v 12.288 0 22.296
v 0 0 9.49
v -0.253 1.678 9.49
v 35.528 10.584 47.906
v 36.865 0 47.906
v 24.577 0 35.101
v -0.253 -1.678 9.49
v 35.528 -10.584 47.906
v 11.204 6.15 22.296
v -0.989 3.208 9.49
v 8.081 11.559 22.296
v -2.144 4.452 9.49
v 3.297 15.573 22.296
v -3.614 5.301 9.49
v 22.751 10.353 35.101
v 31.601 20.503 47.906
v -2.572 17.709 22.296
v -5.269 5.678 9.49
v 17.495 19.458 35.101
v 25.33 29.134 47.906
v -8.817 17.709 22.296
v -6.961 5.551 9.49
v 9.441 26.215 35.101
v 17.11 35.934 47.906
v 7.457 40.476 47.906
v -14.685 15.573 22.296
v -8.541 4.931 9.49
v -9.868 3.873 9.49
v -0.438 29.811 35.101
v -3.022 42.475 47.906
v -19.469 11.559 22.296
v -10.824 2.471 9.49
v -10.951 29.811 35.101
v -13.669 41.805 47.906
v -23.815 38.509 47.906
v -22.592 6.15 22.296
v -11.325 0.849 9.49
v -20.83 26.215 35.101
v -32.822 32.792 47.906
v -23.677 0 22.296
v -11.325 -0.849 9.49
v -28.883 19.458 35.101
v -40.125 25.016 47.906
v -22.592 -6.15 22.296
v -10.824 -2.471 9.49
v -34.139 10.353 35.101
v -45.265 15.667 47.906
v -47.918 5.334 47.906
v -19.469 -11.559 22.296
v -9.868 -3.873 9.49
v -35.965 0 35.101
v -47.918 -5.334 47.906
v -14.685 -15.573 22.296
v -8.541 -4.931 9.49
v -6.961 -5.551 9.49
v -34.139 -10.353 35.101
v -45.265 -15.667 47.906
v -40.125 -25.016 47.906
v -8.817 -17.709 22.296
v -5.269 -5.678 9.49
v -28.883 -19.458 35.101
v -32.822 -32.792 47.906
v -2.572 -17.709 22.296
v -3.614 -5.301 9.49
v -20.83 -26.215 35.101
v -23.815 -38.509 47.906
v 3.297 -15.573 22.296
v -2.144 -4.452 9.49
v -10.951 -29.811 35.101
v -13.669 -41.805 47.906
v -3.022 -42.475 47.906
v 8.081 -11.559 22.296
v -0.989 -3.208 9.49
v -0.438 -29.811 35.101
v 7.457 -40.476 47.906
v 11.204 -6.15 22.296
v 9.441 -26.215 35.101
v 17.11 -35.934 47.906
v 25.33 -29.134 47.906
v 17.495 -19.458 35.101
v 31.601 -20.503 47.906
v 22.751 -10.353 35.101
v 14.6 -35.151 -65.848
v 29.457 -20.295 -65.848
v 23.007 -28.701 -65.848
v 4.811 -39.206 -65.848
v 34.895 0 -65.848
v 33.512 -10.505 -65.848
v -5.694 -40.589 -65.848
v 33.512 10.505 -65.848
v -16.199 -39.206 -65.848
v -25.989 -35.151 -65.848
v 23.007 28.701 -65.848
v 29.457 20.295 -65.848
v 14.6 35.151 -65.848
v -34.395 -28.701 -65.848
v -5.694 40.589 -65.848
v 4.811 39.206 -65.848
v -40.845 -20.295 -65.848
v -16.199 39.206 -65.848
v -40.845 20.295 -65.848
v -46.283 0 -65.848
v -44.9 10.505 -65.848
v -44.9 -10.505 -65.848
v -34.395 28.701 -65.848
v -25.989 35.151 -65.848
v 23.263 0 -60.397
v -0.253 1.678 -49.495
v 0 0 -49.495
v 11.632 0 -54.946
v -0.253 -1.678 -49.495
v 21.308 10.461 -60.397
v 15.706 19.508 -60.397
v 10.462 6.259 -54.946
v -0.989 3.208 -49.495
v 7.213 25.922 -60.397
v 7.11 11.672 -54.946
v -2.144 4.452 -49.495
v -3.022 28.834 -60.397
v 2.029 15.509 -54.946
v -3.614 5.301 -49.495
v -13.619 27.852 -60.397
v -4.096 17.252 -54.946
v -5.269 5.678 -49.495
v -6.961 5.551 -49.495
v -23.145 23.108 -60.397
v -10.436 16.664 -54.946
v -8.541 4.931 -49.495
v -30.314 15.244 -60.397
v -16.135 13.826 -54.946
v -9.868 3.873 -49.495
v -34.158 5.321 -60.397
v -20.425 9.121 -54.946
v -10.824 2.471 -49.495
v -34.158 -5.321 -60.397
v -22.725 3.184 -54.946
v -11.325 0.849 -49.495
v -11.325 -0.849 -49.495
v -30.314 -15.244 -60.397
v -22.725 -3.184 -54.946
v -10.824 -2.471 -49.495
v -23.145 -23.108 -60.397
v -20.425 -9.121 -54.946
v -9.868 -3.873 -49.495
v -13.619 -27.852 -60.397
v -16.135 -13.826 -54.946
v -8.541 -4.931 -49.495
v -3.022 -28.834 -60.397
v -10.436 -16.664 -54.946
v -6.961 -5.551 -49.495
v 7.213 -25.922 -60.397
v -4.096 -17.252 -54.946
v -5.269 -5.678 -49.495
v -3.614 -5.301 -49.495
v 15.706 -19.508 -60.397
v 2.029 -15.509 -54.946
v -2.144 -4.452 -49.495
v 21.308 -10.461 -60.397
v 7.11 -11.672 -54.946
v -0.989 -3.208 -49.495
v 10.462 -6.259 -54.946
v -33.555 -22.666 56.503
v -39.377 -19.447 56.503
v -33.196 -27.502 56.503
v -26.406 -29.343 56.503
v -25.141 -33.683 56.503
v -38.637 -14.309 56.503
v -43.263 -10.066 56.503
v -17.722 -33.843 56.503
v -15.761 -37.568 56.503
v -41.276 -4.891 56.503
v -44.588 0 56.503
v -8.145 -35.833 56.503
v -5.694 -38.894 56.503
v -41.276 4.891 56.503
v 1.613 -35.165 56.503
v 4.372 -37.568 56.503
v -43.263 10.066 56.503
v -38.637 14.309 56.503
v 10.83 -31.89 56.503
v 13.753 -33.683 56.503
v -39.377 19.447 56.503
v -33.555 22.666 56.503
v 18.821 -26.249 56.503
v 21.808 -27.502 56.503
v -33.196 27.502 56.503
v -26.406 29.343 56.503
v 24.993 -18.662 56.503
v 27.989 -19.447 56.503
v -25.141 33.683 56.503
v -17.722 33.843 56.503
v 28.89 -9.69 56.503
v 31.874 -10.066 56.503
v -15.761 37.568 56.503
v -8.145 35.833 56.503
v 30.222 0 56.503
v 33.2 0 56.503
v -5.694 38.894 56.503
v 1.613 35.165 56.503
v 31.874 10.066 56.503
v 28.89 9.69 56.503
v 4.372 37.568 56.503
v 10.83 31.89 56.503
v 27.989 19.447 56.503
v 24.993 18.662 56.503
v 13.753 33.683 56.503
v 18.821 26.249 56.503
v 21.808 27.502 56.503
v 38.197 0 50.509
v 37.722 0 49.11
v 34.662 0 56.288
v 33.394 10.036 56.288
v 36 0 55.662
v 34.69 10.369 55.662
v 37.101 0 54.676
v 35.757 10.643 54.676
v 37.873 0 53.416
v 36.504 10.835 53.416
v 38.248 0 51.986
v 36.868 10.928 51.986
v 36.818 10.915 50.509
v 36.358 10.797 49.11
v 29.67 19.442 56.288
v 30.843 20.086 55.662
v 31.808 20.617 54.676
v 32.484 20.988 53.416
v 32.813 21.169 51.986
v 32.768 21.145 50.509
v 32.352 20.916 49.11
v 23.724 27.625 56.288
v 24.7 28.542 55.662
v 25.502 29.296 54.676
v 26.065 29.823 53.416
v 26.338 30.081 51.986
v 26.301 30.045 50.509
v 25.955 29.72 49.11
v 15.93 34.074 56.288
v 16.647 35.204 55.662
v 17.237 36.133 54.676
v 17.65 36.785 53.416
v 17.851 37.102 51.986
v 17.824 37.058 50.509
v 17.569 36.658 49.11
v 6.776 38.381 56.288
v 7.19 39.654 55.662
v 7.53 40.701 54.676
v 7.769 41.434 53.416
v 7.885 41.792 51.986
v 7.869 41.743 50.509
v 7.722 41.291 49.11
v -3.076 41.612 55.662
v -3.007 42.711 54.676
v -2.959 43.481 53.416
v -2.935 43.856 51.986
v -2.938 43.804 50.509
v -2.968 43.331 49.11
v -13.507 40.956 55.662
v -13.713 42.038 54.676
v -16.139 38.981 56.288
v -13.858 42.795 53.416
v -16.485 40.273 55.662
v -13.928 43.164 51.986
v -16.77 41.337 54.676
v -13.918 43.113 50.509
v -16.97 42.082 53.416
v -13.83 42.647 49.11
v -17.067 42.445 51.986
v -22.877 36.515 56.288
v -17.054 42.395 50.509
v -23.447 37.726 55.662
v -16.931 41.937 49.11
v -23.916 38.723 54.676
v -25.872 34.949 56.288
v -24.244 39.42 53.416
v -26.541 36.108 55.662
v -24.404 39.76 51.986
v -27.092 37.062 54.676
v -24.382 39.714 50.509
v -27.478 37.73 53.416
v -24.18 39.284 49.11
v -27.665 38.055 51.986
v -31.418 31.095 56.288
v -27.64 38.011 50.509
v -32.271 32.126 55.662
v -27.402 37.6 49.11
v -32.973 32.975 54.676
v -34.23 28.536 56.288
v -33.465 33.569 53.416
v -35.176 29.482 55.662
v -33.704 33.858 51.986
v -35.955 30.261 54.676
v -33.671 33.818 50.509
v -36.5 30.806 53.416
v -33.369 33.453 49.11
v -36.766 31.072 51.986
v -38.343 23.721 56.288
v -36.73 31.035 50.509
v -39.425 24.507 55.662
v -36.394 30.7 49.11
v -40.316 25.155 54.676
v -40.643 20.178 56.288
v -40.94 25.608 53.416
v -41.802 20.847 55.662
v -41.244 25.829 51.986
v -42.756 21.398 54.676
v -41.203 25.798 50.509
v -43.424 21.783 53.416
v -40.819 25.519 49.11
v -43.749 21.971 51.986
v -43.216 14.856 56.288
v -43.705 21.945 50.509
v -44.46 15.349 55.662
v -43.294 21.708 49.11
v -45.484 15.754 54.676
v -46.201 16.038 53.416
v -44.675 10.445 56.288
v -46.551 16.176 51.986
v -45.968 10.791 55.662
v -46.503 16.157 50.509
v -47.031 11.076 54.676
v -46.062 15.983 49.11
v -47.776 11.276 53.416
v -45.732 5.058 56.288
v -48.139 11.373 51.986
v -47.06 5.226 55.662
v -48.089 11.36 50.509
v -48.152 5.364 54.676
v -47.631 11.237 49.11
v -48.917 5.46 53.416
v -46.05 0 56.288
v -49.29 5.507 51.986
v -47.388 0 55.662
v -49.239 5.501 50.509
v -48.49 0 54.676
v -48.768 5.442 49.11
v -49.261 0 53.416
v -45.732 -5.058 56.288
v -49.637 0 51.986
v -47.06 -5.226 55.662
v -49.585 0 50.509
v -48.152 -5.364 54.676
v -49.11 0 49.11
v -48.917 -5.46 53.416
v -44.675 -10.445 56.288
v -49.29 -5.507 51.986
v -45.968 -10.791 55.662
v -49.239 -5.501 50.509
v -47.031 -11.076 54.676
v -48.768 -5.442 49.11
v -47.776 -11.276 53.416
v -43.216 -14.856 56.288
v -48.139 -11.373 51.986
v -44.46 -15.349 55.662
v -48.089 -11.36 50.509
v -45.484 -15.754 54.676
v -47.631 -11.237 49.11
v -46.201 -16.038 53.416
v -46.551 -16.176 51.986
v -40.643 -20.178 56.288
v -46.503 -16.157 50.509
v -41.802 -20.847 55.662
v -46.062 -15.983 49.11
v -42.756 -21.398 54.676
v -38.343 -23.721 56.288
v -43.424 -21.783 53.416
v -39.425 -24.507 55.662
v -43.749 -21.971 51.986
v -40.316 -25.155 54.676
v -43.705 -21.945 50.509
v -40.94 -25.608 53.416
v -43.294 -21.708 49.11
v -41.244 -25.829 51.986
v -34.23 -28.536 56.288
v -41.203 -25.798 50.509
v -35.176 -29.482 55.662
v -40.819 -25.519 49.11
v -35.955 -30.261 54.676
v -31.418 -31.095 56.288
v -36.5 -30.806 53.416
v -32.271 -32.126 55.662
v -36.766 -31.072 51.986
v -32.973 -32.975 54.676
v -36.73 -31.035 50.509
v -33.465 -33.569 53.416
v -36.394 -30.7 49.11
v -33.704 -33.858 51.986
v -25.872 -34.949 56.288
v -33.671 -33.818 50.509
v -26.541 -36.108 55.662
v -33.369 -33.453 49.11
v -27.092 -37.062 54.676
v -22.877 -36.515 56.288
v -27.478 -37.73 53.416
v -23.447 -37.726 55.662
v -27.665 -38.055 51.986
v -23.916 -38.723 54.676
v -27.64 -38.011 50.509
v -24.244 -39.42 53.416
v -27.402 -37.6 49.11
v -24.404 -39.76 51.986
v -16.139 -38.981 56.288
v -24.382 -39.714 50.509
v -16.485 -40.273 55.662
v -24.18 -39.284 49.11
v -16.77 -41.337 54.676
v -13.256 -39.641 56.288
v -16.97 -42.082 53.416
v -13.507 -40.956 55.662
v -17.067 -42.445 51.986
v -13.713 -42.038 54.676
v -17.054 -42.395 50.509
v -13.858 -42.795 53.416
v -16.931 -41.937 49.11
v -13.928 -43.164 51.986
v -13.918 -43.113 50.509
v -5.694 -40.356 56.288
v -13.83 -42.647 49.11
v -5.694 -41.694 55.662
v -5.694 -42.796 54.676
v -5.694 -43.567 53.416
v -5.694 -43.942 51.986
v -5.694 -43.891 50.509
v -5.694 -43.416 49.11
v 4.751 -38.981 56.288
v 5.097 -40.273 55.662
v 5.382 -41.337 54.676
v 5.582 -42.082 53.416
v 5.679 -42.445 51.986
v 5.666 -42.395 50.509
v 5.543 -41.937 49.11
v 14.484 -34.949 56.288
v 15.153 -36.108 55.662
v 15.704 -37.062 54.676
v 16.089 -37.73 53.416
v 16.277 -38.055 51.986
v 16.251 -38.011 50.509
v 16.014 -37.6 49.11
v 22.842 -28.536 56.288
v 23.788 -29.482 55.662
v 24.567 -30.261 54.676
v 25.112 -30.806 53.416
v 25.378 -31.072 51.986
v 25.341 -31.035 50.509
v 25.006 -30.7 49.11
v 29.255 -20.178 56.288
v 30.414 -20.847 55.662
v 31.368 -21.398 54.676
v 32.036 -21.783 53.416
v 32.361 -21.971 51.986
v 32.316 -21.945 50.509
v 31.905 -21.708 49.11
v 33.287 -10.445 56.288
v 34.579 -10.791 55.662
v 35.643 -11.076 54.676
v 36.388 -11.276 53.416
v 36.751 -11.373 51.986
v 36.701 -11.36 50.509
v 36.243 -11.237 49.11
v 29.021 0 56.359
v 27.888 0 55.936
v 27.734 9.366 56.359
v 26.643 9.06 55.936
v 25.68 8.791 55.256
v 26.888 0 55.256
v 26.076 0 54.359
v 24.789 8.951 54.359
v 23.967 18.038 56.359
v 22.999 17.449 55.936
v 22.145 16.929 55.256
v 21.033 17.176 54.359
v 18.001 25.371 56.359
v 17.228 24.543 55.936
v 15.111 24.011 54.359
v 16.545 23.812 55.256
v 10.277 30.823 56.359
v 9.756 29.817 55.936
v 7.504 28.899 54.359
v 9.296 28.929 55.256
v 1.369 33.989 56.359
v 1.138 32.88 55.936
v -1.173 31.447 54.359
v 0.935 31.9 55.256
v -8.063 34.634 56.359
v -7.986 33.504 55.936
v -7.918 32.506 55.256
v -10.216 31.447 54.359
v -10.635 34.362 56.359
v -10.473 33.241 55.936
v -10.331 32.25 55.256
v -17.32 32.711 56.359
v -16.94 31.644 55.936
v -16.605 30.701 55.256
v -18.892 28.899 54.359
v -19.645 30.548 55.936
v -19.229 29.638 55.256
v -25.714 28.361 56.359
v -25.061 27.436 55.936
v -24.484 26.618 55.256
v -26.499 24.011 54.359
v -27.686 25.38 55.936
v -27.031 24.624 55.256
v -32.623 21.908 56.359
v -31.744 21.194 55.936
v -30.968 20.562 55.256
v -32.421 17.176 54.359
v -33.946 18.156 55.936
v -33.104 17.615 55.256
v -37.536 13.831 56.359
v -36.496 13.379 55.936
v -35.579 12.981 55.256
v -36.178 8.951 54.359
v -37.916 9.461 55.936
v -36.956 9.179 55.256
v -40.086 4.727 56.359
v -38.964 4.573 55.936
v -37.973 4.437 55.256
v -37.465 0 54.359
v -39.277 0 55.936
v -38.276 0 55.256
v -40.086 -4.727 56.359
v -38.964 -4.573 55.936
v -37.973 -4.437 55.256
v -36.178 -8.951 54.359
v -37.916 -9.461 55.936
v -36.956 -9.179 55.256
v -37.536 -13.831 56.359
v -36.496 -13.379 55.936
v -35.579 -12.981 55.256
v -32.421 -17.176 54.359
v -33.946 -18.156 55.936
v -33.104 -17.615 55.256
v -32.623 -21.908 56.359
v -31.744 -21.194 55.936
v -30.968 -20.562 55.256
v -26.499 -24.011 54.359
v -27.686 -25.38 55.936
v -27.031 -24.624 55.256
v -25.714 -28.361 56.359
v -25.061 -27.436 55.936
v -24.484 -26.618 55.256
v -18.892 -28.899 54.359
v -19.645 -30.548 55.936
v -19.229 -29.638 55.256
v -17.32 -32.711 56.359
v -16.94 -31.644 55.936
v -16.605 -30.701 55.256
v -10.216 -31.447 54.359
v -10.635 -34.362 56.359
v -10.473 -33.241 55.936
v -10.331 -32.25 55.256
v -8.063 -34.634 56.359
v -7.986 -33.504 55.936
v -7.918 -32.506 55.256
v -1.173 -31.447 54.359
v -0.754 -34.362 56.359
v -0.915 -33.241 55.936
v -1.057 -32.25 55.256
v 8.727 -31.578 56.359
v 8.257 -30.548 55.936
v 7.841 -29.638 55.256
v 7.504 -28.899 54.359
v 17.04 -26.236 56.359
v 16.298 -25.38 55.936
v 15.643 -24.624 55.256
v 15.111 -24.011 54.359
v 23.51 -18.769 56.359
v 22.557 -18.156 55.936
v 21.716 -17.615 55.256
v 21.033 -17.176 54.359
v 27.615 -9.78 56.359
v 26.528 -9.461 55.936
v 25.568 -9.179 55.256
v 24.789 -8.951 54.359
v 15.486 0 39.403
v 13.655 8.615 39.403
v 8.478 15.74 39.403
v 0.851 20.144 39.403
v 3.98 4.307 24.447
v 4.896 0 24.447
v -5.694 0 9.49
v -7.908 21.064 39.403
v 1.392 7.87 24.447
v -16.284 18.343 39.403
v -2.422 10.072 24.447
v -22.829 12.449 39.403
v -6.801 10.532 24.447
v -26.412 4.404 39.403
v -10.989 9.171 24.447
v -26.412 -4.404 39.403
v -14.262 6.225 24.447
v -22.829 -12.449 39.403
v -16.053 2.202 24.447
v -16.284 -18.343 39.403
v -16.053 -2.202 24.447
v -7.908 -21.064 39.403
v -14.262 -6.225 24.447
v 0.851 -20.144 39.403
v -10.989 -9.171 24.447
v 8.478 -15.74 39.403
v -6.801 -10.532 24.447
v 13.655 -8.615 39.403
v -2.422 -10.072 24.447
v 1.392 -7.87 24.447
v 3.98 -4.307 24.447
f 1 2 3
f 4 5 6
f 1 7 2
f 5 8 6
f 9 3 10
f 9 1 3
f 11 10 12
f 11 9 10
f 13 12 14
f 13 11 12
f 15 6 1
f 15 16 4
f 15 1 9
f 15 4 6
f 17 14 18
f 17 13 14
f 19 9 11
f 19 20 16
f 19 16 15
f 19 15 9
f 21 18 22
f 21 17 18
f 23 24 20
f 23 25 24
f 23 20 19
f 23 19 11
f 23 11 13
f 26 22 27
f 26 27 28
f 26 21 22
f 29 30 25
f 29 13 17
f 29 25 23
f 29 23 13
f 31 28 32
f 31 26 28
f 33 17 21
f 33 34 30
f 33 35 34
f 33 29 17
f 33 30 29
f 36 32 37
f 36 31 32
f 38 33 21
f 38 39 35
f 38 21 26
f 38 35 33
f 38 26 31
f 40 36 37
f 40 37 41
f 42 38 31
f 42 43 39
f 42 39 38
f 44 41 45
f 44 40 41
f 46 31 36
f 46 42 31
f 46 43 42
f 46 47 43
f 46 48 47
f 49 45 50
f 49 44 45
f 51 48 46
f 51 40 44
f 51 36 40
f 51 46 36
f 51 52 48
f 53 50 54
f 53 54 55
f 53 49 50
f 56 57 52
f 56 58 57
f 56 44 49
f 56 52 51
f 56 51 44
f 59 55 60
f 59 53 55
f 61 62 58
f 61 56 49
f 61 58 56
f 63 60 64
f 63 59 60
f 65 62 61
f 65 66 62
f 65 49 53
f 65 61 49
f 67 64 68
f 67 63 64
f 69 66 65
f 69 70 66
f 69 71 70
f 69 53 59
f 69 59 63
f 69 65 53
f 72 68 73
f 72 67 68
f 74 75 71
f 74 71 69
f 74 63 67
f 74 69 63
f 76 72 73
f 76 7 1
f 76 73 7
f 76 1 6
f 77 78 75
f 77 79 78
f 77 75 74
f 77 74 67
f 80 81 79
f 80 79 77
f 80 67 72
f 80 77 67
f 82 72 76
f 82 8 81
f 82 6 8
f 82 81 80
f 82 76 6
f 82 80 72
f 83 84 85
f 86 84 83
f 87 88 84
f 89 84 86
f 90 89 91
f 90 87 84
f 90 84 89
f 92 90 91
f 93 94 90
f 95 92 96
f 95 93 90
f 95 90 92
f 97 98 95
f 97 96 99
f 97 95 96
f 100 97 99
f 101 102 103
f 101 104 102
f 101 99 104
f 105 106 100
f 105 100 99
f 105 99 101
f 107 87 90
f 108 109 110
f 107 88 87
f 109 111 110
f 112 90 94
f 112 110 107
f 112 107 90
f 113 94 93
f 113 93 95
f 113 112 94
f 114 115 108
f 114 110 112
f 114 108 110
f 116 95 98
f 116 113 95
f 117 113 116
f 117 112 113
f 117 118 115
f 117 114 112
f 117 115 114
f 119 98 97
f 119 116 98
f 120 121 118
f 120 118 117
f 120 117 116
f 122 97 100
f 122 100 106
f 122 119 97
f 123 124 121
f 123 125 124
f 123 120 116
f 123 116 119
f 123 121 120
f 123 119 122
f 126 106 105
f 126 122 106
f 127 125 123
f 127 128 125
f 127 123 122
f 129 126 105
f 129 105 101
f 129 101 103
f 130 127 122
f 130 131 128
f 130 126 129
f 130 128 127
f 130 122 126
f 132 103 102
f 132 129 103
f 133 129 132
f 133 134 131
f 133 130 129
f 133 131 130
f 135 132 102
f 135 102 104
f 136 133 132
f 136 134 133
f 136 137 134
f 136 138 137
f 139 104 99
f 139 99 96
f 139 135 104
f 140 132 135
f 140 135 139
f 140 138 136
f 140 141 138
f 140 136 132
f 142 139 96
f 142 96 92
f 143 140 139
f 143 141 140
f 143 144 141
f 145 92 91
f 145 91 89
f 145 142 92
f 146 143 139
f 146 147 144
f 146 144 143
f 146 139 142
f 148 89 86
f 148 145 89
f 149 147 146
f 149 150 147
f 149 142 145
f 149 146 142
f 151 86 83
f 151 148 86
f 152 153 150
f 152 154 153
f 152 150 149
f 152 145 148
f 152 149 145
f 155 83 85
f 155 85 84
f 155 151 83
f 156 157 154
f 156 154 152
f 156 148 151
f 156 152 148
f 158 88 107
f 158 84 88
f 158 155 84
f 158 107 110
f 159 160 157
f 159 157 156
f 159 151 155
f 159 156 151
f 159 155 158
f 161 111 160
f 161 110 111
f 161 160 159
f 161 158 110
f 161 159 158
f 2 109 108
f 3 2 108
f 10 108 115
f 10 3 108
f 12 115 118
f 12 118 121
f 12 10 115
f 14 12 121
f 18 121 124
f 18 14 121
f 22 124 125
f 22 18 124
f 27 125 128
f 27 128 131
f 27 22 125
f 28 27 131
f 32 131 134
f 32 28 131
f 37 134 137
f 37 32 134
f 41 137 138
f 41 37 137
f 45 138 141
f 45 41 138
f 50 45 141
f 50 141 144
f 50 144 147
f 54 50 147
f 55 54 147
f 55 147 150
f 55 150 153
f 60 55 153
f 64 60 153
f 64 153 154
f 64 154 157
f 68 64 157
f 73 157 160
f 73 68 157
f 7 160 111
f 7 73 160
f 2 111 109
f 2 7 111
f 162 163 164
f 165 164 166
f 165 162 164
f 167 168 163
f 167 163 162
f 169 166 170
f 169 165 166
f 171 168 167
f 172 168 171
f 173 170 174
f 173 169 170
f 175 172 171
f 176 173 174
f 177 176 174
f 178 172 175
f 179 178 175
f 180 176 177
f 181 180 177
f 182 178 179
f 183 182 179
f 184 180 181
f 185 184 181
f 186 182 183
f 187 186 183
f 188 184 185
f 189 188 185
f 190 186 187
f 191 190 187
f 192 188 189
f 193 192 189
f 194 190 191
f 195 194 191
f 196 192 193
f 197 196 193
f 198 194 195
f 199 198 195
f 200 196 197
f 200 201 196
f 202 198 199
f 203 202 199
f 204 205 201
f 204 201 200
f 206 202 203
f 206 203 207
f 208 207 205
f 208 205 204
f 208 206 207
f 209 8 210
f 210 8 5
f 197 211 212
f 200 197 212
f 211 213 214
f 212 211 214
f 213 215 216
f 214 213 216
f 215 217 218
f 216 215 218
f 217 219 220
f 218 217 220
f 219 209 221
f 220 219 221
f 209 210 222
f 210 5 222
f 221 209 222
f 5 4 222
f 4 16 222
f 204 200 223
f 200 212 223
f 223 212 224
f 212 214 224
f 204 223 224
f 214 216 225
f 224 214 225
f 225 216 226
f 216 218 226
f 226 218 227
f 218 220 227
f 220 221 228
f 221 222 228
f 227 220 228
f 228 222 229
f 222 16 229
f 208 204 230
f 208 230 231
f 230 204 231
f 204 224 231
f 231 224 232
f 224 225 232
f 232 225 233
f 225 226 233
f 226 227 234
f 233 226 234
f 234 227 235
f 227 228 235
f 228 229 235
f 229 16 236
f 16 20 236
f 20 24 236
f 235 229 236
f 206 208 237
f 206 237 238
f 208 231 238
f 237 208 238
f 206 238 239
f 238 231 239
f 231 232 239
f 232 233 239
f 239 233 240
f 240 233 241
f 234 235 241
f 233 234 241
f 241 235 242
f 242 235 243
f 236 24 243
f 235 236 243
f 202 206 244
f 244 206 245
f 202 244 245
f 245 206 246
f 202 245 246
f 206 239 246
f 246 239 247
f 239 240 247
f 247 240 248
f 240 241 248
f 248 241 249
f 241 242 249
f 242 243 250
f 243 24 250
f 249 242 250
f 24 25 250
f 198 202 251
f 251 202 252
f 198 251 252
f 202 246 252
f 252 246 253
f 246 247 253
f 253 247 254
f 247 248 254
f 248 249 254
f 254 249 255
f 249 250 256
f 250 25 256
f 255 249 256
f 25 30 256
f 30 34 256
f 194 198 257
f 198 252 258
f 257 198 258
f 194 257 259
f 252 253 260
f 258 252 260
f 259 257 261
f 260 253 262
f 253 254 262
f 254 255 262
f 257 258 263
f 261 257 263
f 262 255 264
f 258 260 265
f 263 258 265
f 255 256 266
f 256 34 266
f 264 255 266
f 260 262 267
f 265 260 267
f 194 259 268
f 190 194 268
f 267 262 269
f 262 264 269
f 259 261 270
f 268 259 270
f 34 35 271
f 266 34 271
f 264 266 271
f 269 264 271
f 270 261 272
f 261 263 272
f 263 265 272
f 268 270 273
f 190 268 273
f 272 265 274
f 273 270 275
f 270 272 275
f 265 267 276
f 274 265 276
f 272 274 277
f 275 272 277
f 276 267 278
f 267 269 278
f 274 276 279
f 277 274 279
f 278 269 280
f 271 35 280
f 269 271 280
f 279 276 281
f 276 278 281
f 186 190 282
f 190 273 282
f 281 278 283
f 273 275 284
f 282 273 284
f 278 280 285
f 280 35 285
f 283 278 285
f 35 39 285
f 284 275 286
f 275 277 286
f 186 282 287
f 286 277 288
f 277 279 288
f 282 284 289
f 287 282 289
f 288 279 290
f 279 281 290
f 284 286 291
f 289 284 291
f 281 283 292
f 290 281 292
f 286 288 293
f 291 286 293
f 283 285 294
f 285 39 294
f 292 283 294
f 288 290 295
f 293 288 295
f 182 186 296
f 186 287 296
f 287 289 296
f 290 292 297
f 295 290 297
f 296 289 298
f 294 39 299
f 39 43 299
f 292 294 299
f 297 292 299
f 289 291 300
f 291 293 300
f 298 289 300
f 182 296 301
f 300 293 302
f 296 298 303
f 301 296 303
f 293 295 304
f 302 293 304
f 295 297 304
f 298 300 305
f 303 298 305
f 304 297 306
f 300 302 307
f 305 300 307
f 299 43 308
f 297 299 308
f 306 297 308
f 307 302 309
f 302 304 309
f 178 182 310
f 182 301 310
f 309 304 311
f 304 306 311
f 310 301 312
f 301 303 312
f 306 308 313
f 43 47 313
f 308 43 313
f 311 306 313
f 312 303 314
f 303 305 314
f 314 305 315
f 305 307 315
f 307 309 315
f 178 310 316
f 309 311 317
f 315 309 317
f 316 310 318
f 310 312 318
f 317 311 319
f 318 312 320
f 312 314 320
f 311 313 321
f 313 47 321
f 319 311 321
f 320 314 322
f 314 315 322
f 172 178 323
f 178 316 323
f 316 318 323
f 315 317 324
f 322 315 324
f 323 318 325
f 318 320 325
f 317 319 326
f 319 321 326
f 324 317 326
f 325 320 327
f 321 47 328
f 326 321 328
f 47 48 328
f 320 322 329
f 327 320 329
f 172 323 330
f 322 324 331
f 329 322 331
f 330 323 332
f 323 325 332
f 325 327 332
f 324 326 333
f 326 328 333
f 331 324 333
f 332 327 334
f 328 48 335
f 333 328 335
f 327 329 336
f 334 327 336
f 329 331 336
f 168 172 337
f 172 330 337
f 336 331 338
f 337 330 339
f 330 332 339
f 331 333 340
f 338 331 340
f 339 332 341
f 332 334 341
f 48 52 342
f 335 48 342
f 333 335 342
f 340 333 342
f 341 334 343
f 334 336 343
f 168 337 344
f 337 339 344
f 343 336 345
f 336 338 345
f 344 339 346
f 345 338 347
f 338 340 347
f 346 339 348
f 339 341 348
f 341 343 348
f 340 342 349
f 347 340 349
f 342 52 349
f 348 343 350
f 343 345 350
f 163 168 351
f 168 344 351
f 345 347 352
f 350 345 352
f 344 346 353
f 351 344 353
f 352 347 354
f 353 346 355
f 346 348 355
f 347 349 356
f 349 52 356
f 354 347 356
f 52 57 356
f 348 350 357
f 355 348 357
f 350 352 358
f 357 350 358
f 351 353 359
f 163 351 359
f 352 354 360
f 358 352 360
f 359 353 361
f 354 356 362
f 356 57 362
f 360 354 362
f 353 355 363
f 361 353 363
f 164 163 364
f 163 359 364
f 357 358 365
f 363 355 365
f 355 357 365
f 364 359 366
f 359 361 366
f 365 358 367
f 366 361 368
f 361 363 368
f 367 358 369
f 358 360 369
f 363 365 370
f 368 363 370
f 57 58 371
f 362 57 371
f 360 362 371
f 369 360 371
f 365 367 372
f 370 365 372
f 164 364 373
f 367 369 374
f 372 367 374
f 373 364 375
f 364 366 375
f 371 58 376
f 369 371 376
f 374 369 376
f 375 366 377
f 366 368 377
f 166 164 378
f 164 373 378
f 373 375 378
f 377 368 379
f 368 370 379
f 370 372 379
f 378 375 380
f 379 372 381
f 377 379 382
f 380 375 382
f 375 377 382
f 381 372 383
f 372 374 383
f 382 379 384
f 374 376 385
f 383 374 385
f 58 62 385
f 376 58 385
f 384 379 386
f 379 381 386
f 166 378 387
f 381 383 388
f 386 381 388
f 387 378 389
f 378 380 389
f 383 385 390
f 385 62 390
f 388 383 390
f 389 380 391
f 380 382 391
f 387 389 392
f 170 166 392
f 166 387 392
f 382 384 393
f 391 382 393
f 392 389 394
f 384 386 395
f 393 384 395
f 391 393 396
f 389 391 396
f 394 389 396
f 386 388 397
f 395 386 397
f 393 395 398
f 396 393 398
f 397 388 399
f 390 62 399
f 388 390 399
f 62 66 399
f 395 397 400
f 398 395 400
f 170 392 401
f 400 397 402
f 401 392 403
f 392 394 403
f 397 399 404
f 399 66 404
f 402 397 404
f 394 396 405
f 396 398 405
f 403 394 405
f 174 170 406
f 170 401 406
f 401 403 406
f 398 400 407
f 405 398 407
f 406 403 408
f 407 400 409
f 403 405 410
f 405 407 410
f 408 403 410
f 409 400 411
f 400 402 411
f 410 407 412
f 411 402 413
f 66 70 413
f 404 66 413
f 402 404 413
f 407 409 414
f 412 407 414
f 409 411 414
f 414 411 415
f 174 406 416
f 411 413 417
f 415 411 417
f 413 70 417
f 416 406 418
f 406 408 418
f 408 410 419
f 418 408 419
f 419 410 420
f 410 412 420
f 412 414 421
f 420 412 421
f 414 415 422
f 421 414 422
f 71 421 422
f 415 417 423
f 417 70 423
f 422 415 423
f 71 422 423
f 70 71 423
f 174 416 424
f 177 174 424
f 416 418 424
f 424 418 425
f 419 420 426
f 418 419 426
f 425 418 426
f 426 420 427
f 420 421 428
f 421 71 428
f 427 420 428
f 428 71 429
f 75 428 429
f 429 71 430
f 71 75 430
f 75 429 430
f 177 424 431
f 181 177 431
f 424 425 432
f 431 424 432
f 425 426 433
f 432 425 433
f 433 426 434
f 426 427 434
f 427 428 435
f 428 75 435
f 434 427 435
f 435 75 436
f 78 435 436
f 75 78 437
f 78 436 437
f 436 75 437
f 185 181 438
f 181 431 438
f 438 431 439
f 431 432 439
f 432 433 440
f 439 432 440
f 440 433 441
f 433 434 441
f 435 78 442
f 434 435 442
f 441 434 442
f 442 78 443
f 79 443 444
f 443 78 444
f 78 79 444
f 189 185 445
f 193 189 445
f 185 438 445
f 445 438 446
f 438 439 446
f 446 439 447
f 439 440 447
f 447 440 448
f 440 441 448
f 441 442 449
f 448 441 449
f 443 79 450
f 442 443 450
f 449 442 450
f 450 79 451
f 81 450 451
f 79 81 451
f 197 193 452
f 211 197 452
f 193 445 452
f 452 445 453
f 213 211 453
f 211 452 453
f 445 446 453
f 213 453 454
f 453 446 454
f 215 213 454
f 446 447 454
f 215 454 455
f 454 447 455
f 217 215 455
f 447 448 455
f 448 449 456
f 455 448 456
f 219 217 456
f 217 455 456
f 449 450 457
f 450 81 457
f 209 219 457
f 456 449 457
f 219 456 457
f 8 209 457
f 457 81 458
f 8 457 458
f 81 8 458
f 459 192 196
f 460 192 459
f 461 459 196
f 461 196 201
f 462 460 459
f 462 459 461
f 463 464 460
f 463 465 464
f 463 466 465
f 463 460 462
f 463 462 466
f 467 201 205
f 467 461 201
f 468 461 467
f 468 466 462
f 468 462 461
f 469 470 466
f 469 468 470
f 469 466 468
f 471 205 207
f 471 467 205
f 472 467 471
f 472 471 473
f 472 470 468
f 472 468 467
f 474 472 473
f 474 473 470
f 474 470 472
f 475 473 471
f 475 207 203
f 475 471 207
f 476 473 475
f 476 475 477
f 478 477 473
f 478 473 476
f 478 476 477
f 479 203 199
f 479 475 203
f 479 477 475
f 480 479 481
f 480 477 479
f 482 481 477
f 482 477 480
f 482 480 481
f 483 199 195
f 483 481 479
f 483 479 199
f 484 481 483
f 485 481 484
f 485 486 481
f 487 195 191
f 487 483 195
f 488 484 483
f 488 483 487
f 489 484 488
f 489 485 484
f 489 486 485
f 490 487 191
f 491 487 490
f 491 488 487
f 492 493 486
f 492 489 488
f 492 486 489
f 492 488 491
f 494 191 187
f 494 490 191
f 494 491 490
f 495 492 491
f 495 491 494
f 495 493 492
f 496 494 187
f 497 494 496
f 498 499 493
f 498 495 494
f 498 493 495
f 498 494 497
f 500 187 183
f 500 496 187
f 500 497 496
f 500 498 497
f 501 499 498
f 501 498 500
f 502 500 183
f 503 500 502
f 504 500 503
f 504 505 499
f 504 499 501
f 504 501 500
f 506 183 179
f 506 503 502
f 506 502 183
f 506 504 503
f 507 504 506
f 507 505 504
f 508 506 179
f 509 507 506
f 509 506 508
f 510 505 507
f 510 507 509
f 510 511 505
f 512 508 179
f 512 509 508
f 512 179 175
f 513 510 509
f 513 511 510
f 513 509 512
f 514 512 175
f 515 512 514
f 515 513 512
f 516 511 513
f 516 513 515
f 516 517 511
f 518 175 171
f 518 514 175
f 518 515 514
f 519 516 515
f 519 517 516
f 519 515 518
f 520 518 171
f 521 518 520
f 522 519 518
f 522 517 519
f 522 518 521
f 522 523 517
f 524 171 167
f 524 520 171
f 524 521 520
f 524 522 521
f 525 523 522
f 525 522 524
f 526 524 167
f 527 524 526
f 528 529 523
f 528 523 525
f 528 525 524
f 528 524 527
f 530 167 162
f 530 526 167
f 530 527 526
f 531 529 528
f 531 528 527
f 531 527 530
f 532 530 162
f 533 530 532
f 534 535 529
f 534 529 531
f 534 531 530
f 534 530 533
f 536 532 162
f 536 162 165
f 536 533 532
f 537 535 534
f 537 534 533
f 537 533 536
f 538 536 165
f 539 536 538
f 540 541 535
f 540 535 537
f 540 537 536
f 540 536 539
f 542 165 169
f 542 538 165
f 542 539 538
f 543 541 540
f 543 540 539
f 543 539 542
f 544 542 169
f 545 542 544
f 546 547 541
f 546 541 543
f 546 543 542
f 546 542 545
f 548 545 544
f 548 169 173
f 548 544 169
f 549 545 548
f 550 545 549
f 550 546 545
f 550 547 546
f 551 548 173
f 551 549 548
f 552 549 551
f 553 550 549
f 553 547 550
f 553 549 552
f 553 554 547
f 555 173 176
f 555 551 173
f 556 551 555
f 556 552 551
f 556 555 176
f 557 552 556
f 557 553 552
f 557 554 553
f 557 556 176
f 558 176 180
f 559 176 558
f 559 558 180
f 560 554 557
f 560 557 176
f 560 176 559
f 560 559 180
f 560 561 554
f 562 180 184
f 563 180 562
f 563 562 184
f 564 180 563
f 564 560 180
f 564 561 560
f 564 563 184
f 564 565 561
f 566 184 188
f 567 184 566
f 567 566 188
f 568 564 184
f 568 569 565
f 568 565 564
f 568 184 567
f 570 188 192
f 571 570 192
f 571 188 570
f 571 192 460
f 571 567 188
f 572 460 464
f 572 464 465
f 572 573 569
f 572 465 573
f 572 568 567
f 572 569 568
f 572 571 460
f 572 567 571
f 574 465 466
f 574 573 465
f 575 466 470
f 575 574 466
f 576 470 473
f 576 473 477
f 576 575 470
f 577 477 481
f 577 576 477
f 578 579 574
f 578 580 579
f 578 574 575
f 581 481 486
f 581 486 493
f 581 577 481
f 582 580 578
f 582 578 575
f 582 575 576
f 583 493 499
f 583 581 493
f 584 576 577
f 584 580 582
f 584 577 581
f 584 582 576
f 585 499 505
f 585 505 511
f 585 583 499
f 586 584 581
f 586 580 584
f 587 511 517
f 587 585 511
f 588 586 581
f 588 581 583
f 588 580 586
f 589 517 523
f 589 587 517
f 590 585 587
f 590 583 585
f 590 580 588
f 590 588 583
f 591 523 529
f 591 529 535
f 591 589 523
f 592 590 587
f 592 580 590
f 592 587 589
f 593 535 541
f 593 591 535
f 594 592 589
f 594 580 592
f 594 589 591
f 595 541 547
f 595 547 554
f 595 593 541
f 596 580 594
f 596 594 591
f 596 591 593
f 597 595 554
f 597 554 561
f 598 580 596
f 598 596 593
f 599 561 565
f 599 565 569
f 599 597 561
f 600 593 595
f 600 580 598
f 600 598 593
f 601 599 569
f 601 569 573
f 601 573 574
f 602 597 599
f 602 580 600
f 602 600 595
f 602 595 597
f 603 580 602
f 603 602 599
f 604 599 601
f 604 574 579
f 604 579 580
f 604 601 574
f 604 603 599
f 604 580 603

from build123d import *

# Parameters (mm, degrees)
F2_R = 5.08
F3_R = 5.08


with BuildPart() as f1:
    # F0 (on Front) → F1 (revolve)
    with BuildSketch(Plane.XZ):
        Polygon((45.1151281595, 56.5034113824), (27.5946892798, 56.5034113824), (-5.6941420771, 9.4902375713), (-5.6941420771, -65.8476427197), (34.8948761821, -65.8476427197), (0, -49.4952350855), (0, 9.4902375713), align=None)
    revolve(axis=Axis((-5.6941420771, 0, -28.1787025742), (0, 0, 1)))

    # F2
    f2_edges = [f1.edges().sort_by_distance(p)[0] for p in [
        (-56.503412, 0, 56.503411),
    ]]
    fillet(f2_edges, radius=F2_R)

    # F3
    f3_edges = [f1.edges().sort_by_distance(p)[0] for p in [
        (-38.982973, 0, 56.503411),
    ]]
    fillet(f3_edges, radius=F3_R)


solid = f1.part
